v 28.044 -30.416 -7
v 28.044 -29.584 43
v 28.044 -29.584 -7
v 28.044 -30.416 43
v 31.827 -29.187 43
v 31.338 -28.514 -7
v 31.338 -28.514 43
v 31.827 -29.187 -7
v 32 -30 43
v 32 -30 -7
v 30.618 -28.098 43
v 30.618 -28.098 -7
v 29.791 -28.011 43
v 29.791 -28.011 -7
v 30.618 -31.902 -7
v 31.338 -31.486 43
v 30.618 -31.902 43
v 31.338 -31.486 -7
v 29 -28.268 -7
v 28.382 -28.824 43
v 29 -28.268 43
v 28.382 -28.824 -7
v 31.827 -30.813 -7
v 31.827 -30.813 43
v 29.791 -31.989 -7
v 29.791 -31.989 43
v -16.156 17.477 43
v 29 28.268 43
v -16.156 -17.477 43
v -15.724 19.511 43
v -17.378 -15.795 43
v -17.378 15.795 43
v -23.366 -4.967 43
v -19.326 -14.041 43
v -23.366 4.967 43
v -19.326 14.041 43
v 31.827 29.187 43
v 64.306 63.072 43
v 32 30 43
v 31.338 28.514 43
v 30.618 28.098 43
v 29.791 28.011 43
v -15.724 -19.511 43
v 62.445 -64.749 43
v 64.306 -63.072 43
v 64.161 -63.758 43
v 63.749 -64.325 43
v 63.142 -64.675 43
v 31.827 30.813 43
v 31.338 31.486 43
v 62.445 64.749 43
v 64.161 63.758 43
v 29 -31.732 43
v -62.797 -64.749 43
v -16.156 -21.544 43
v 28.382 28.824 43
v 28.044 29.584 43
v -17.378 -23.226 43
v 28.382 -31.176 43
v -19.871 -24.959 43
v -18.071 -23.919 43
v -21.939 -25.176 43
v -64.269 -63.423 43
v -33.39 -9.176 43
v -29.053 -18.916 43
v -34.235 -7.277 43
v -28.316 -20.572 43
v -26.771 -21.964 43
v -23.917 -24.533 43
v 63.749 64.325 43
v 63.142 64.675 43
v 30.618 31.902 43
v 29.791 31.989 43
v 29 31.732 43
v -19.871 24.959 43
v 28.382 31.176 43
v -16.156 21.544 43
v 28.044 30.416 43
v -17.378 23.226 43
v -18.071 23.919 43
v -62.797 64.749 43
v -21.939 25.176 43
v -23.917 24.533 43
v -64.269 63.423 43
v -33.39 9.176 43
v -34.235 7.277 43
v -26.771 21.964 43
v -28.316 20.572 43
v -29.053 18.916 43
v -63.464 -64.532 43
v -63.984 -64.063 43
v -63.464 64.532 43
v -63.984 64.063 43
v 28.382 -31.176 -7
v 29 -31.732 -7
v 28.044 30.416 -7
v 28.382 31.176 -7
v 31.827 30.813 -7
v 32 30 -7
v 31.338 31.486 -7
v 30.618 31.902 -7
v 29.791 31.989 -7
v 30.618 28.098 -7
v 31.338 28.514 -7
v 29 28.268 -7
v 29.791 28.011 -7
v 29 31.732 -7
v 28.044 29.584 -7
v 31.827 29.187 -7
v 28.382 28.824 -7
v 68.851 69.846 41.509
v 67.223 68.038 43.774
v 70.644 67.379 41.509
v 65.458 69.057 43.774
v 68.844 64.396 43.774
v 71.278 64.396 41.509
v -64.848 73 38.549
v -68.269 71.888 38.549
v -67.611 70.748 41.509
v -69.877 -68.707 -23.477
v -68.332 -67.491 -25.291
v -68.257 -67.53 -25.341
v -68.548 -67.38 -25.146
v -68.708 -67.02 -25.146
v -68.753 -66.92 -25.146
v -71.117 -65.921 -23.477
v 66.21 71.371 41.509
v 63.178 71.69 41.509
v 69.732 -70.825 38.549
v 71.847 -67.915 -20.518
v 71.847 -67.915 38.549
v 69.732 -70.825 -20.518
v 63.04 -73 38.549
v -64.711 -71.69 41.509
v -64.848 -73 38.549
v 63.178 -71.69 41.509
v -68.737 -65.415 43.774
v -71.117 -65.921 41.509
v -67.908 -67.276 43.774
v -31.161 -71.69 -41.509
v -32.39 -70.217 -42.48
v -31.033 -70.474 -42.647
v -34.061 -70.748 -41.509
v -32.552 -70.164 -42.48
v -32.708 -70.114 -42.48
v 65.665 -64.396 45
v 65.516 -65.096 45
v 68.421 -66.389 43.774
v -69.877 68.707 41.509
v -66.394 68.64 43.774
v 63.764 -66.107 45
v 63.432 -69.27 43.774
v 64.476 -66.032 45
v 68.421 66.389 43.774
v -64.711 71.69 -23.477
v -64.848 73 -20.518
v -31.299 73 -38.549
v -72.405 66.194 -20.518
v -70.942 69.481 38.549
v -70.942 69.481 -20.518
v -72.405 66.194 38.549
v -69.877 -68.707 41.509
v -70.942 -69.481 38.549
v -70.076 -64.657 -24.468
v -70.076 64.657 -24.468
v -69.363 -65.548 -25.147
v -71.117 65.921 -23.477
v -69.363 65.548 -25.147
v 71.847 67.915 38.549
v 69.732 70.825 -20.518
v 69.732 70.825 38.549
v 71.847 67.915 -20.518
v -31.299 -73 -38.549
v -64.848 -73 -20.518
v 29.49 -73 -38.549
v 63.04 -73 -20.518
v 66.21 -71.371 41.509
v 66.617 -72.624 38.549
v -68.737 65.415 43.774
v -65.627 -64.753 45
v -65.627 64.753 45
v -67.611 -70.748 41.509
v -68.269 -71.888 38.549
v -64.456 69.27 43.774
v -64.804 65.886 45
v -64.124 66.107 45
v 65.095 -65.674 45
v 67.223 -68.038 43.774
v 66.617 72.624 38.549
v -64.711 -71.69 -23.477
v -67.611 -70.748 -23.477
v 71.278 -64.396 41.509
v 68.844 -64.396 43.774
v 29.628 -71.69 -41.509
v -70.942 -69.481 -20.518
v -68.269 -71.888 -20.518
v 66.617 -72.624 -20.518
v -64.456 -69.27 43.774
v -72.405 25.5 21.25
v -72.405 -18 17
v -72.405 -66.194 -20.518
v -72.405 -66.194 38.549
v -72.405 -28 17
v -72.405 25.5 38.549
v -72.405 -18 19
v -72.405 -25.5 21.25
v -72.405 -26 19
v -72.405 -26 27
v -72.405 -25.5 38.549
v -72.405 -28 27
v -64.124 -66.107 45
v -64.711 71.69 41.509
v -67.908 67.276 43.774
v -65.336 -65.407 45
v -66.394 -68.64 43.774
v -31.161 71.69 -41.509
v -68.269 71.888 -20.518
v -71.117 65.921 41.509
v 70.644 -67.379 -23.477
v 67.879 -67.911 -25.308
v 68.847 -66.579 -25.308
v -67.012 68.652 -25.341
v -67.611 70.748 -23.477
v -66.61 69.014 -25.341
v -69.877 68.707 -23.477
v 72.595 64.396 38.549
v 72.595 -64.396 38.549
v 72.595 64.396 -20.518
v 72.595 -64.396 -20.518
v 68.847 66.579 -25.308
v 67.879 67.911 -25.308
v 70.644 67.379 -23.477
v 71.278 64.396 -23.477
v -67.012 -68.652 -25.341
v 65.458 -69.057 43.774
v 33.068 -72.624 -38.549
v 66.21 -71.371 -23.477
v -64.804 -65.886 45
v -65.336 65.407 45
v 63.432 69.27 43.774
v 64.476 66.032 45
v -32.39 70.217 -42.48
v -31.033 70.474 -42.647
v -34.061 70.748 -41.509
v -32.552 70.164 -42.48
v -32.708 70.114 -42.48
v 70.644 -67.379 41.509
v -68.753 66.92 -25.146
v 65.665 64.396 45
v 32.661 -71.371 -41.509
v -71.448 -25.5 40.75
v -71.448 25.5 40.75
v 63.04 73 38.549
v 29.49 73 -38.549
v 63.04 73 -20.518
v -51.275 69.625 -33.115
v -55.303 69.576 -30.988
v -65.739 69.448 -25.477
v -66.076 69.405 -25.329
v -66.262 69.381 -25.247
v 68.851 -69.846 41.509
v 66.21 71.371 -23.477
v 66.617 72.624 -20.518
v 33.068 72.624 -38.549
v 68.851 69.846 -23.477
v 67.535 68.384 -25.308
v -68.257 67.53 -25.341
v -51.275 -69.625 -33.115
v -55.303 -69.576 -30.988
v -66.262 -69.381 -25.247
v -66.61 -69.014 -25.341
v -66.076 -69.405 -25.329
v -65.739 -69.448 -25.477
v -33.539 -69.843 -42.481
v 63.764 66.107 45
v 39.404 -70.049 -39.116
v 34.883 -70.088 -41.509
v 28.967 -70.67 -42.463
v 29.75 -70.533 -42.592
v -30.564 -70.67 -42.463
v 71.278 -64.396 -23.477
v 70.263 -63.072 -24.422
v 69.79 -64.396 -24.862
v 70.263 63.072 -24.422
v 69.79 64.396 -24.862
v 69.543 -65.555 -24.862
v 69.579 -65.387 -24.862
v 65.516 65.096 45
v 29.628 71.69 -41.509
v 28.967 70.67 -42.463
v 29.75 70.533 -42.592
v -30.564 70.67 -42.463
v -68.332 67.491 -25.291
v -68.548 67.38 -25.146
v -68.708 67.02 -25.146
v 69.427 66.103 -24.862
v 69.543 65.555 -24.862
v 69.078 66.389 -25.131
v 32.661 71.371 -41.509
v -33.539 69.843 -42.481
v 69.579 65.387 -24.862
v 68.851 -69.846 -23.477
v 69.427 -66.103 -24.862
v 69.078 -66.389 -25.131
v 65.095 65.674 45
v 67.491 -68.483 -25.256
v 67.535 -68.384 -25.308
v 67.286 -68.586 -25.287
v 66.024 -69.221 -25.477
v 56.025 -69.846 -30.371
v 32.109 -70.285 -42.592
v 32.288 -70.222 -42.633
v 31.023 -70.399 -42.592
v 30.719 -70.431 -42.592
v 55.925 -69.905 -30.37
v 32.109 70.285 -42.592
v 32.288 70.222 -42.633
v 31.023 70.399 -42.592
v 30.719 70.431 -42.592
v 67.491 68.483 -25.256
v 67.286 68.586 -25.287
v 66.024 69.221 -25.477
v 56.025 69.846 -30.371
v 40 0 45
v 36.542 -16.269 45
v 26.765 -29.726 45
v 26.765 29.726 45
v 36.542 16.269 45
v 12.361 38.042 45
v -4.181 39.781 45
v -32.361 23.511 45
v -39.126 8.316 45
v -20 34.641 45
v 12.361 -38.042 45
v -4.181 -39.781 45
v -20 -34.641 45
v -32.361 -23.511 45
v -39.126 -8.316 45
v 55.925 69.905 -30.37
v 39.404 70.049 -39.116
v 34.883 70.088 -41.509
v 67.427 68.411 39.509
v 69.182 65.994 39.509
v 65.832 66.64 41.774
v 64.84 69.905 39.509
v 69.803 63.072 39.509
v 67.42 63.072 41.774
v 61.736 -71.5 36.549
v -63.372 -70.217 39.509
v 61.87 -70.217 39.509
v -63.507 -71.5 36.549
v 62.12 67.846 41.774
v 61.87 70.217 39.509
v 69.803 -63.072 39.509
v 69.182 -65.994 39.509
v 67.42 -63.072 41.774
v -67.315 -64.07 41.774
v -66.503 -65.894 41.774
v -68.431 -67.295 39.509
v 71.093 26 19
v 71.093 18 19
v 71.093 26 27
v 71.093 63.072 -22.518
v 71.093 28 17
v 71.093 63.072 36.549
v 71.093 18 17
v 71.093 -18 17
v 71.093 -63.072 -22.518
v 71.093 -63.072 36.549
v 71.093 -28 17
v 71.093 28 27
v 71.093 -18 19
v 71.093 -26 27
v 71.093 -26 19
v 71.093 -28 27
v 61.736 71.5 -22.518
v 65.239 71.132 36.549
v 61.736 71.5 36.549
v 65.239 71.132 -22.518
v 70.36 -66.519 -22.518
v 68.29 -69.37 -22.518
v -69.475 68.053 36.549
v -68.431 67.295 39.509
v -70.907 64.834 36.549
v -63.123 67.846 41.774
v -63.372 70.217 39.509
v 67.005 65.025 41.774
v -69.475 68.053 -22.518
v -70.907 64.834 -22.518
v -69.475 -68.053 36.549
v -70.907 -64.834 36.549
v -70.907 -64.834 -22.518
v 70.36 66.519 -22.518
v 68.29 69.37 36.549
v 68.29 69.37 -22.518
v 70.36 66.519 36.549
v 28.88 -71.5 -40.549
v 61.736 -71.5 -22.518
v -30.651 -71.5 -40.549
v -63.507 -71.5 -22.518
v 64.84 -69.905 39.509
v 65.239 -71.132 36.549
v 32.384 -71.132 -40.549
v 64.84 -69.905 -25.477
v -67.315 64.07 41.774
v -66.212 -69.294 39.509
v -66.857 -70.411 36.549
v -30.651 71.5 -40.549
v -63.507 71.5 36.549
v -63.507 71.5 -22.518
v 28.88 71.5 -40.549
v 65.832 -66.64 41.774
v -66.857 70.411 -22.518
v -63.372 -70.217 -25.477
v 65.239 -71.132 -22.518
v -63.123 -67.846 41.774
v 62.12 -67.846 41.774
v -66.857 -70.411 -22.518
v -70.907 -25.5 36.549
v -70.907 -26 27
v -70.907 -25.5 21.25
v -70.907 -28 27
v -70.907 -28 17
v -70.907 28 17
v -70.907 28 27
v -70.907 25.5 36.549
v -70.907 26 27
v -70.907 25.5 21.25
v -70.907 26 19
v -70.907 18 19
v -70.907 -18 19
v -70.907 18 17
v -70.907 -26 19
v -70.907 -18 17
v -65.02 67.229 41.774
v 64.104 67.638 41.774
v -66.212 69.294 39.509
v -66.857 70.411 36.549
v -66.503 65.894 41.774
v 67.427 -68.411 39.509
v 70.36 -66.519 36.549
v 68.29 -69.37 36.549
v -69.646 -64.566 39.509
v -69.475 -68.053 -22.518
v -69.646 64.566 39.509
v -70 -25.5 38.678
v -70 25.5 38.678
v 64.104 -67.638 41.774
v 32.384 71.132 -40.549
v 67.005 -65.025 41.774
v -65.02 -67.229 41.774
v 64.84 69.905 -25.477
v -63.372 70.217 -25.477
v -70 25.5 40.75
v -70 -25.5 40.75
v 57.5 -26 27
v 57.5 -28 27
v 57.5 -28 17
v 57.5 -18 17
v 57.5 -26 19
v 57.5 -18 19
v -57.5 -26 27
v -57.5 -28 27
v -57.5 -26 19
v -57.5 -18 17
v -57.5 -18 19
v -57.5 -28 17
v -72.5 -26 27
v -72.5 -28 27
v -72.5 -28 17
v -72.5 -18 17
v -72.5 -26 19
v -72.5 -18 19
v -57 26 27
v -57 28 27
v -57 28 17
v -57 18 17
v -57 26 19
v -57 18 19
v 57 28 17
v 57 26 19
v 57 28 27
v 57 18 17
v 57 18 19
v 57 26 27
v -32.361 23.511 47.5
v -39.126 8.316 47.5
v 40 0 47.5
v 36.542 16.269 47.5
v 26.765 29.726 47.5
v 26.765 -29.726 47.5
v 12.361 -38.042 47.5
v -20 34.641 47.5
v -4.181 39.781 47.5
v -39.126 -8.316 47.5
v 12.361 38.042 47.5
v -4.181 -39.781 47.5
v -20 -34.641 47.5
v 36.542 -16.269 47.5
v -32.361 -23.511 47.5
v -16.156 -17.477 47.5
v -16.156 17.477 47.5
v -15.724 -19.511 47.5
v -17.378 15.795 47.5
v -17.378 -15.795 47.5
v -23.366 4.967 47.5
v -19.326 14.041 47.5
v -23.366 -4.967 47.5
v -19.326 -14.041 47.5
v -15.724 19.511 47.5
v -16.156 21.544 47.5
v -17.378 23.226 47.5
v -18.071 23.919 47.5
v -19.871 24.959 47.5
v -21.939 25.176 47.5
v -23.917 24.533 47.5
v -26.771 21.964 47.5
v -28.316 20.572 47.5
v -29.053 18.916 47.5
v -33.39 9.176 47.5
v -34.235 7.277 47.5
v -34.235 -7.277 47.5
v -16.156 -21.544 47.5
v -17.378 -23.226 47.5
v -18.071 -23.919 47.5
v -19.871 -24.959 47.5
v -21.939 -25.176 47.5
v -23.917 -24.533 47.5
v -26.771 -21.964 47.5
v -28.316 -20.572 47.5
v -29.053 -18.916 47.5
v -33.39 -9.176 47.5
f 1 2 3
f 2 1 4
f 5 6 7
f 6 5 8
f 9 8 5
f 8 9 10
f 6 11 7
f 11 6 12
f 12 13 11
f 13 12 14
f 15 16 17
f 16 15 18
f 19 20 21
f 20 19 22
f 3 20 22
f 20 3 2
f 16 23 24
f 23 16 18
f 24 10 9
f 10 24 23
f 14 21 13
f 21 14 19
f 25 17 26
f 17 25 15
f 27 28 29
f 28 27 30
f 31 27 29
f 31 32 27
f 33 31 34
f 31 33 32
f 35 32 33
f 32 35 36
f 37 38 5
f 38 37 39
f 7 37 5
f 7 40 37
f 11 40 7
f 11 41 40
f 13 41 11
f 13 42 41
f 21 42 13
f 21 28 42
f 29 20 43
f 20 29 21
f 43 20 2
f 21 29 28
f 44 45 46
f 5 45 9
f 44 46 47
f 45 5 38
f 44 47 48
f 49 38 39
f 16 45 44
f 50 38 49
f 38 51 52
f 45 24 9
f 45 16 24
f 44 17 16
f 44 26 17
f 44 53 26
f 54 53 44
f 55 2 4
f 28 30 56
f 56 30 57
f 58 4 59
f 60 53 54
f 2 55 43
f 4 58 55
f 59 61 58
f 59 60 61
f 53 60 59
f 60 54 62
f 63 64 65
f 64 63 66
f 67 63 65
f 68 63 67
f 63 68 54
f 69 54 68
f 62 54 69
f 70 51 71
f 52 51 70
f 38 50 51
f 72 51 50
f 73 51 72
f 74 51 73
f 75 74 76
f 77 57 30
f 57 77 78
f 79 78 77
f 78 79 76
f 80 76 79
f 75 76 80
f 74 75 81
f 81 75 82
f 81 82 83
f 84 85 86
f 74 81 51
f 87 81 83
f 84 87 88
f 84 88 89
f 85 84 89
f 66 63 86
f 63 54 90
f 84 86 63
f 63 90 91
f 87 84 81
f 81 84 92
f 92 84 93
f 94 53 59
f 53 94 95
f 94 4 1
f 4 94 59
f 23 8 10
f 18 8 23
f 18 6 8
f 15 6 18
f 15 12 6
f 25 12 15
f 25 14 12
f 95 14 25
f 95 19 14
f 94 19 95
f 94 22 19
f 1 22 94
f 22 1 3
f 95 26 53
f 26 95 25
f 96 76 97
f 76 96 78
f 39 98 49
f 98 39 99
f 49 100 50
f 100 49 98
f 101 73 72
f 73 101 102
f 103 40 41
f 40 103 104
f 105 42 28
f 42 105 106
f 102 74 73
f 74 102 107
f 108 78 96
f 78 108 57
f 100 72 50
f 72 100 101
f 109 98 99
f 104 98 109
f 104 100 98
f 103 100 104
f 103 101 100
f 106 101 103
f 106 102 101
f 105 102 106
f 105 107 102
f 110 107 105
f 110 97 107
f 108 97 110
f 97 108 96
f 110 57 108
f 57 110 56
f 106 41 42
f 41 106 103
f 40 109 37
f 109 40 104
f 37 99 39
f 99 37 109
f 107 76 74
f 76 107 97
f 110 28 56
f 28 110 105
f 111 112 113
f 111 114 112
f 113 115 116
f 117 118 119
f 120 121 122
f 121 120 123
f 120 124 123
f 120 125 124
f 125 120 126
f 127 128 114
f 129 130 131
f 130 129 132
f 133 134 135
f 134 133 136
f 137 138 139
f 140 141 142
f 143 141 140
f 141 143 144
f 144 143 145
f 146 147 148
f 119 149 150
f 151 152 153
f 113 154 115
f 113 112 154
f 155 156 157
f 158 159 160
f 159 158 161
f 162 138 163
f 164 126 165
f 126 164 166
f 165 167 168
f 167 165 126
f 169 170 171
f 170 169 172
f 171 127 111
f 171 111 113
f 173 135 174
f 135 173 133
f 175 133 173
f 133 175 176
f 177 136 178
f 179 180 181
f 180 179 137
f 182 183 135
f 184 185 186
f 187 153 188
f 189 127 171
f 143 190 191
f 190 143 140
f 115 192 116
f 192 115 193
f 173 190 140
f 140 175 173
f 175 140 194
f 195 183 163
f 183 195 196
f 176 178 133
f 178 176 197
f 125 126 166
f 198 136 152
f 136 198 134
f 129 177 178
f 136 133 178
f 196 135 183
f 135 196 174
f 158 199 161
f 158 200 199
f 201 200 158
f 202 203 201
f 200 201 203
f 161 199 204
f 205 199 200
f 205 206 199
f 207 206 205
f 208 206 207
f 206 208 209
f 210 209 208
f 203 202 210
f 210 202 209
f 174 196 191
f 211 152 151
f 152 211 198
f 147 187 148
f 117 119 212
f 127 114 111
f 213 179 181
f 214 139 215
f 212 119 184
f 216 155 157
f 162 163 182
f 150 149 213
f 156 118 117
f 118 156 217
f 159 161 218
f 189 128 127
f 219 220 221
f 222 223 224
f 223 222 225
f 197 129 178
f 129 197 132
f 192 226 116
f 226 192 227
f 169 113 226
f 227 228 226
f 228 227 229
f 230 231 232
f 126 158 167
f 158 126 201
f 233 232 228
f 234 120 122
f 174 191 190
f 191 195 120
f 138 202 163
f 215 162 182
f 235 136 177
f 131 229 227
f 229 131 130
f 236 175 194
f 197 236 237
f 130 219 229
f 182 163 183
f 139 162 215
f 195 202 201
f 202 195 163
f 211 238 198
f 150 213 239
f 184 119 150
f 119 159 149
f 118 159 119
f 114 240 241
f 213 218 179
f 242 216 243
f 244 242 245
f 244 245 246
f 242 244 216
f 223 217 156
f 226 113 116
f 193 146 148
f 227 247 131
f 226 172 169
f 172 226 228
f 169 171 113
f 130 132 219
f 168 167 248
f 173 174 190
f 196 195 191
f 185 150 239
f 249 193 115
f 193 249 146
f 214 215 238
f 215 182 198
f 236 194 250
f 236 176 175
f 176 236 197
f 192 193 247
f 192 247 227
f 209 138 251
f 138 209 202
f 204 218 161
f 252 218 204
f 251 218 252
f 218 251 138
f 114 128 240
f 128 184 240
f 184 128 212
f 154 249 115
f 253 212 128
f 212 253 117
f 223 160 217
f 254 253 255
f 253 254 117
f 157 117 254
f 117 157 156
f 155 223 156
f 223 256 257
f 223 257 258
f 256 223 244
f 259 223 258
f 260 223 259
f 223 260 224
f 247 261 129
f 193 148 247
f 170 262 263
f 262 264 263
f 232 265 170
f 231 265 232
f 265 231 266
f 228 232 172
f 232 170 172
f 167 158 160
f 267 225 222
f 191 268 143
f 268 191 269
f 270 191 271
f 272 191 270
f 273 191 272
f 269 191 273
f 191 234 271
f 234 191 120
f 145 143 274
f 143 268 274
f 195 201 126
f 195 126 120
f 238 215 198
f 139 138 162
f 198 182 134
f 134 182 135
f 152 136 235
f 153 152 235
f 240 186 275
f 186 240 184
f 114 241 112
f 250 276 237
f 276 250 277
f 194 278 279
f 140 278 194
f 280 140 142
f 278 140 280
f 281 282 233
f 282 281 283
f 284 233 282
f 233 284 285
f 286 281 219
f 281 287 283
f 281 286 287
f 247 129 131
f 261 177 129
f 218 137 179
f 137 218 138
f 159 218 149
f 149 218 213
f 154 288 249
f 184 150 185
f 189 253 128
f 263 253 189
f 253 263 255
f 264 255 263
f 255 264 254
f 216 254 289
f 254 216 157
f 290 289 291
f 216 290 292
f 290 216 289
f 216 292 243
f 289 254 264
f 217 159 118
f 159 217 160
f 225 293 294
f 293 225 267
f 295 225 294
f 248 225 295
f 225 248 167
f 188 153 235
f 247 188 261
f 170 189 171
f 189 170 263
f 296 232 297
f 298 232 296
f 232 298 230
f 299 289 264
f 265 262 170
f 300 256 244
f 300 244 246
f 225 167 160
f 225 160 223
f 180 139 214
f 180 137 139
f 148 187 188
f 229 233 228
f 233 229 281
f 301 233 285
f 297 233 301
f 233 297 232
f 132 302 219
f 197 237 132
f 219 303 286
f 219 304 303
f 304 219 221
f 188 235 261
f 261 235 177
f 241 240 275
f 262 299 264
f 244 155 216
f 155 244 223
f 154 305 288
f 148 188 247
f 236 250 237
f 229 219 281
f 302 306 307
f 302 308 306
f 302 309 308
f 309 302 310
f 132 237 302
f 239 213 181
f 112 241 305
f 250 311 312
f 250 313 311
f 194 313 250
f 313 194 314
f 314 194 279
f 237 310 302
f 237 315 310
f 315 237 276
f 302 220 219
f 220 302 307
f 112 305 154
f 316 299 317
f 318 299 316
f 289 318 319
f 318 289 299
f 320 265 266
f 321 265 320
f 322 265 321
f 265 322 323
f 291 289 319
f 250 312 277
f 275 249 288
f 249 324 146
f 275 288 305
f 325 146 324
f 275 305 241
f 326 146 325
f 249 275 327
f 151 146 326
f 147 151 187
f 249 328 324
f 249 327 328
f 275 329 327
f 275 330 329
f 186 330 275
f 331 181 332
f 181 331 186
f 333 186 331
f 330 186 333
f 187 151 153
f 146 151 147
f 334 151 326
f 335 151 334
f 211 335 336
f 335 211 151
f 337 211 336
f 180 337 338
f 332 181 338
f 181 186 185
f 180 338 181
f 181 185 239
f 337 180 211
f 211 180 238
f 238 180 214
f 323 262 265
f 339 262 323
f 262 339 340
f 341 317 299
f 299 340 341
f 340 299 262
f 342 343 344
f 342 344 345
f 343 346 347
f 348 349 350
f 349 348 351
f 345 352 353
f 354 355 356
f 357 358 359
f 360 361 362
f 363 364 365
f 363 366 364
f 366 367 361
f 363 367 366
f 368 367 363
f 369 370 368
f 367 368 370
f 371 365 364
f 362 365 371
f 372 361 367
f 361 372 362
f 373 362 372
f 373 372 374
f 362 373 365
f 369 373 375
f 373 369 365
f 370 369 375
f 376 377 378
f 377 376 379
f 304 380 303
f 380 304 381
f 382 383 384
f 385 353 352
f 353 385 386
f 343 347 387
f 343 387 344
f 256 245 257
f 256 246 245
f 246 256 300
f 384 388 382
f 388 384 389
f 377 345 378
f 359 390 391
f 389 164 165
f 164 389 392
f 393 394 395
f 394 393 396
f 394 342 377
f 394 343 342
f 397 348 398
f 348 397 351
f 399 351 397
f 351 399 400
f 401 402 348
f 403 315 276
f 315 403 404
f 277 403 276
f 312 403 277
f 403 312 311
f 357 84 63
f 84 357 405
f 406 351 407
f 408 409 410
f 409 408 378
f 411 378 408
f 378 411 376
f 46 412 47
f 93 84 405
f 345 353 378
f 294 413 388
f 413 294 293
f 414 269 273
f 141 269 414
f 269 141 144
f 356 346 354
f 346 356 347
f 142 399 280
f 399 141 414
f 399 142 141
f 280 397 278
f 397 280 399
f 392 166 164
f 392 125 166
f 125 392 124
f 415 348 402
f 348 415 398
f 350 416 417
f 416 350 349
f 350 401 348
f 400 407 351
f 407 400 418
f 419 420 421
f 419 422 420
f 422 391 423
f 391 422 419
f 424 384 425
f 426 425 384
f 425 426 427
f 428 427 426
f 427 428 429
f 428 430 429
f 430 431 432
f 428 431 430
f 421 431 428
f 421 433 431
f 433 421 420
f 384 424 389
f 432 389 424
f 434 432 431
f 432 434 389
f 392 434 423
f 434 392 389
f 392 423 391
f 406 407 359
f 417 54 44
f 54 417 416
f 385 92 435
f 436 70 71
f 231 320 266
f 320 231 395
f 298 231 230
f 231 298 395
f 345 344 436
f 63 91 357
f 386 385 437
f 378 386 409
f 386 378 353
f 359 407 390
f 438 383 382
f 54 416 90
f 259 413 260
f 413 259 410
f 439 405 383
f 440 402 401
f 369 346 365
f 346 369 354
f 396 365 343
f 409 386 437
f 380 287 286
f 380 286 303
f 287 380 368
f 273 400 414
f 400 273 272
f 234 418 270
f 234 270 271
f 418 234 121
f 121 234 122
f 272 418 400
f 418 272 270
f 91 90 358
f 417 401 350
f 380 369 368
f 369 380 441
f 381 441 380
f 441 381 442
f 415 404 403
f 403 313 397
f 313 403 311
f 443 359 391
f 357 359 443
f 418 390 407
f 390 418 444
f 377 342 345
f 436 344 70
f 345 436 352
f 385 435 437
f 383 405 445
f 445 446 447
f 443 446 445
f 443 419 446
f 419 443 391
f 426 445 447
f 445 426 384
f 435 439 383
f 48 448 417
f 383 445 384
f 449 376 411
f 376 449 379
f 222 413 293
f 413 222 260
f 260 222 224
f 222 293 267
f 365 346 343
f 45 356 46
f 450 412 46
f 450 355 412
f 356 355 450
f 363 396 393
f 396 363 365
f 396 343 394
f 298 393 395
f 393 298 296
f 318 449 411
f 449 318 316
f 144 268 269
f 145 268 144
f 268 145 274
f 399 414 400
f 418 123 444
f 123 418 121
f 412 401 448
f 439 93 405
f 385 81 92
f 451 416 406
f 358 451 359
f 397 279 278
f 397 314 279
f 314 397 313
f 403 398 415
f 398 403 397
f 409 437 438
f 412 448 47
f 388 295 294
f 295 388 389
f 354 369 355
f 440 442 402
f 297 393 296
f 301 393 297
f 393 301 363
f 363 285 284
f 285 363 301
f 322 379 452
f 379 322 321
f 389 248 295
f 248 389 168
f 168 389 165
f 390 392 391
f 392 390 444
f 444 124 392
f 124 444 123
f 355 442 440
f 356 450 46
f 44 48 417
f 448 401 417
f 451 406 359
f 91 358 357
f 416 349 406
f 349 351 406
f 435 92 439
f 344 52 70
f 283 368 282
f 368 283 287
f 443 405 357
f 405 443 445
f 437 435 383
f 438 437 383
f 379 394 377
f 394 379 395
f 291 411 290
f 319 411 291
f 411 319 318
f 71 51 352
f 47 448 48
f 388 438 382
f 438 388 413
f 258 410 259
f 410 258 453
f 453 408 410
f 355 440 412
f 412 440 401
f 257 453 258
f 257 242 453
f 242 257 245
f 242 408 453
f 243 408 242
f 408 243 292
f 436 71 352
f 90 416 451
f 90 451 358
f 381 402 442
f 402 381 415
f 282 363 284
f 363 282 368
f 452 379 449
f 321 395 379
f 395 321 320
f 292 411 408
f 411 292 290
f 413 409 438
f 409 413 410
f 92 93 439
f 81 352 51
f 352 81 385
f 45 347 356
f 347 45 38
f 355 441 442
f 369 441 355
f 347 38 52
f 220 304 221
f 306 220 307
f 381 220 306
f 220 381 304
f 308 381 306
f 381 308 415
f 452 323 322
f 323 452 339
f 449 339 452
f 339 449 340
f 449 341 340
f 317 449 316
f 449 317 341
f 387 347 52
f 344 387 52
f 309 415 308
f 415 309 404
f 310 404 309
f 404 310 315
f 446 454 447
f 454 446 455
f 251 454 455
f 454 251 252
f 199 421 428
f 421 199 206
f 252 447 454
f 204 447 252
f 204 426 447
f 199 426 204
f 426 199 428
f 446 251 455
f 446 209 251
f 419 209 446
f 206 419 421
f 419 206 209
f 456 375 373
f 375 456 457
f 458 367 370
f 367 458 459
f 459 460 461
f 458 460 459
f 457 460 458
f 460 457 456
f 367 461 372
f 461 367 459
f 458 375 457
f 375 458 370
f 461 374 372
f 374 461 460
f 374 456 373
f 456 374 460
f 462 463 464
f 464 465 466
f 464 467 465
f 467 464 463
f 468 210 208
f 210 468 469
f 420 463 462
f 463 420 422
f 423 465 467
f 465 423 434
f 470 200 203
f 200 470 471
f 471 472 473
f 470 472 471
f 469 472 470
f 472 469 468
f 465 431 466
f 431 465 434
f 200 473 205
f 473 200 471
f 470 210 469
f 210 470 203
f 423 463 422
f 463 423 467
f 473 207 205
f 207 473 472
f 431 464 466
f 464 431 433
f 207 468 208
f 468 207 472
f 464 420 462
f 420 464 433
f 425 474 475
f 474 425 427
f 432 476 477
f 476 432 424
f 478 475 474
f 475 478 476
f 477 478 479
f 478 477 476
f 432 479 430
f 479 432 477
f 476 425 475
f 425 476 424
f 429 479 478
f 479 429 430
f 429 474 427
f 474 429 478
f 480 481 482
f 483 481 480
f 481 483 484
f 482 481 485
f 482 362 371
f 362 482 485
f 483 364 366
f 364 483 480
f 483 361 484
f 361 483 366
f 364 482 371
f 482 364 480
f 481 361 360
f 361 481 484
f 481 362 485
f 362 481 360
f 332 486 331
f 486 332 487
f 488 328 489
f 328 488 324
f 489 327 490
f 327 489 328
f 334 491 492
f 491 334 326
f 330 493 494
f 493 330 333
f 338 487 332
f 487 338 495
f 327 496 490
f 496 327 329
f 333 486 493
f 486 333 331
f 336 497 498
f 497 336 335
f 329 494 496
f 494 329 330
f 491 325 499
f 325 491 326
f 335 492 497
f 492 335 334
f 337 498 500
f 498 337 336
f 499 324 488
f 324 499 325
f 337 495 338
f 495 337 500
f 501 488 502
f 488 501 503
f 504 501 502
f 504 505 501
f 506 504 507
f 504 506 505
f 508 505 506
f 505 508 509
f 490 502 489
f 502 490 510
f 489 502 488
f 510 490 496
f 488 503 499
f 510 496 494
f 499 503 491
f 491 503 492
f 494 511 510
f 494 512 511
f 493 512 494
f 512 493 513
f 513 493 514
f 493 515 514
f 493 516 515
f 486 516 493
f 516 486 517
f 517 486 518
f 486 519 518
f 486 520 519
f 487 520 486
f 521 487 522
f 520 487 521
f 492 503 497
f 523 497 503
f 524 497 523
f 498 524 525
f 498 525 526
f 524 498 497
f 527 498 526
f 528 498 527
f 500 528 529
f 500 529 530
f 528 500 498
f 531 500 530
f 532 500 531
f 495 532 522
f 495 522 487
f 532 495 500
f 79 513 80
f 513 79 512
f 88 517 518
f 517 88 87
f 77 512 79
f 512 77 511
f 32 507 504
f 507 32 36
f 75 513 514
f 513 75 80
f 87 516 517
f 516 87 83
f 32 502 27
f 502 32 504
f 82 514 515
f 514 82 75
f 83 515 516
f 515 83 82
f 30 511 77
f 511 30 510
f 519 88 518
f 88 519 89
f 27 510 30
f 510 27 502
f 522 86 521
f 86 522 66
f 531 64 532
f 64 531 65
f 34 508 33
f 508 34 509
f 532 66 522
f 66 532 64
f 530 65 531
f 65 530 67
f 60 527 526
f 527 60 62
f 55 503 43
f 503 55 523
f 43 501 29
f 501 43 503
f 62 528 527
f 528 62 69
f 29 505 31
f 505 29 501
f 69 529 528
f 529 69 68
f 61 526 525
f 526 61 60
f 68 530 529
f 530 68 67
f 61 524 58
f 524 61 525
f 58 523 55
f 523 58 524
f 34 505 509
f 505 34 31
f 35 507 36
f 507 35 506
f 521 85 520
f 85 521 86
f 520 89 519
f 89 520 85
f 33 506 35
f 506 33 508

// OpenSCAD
$fn=15;
wall = 2.5;
bw = 110+ wall*2 ;
bd = 131 + wall*2;
bh = 50;
base_thick=2.5;
base_h_offset =0;

tile_w = 20;
tile_h = 20;
tile_edge_r = wall/4;

head_h=40;
head_w=130;
head_wall=1.5;

skirt_w = 140 +wall*2;
skirt_d = 146 ;
skirt_h = 90;
skirt_wr = 10;
skirt_dr = 10;
skirt_rh = 10;
skirt_r = 10;
skirt_wall_sides = 1.5;
skirt_wall_top = 2;



module pyramid(side=10, height=-1, square=false, centerHorizontal=true, centerVertical=false){
// creates a 3 or 4 sided pyramid.  -1 height= tetrahedron or Johnson's Solid square pyramid
	mHeight= height!=-1 ? height:
		square == true ? (1/sqrt(2))*side:		//square
			sqrt(6)/3*side;						//tetra
	vert= centerVertical!=true ? [0,0,0]:
		square==false ? [0,0,-mHeight/4] :	 //inscribes a tetra inside a sphere, not 1/2 ht
			[0,0,-mHeight/2];	//for squares, center=false inscribes, so true is just 1/2 ht
	horiz= centerHorizontal!= true ? [0,0,0] :
		square == true ? [-side/2, -side/2, 0] : 	//square
			[-side/2,-sqrt(3)*side/6 ,0];			//tetra
	translate(vert+horiz){
		if (square == true){
			polyhedron (	points = [[0,0,0],[0,side,0],[side,side,0],
								[side,0,0],[side/2,side/2,mHeight]], 
						faces = [[1,0,2], [2,0,3], [0,4,3], 
								[3,4,2], [2,4,1], [1,4,0]]);
		}
		if (square != true){
			polyhedron (	points = [[0,0,0],[side,0,0],[side/2,sqrt(3)*side/2,0],
								[side/2,sqrt(3)*side/6,mHeight]], 
						faces = [[0,1,2], [1,0,3], [2,1,3],[2,3,0]]);			
		}
}	}

module tile(){
    cube([tile_w,wall+0.03,tile_h],center=true);
    translate([0,0,0])
    {
        minkowski()
        {
            cube([tile_w,0.1,tile_h],center=true);
            sphere(r=tile_edge_r);
        }
    }
    translate ([-tile_w/2-tile_edge_r/2,0,-tile_h/2+tile_edge_r*2])
        sphere(r=tile_edge_r);

    translate ([tile_w/2+tile_edge_r/2,0,-tile_h/2+tile_edge_r*2])
        sphere(r=tile_edge_r);
    
}


module tiles(){
    for (x=[-2:2:3])    
    {    
        translate([x*tile_w,bd/2-wall/2,bh/2+tile_h/2])
        tile();   
        translate([x*tile_w,-bd/2+wall/2,bh/2+tile_h/2])
        tile();   
        
        translate([-bw/2+wall/2,x*tile_w,bh/2+tile_h/2])
        rotate([0,0,90])
        tile();   
        translate([bw/2-wall/2,x*tile_w,bh/2+tile_h/2])
        rotate([0,0,90])
        tile();     
    } 
}

module top(){
    
    difference()
    {
        cube ([bw,bd,bh+tile_h],center=true);
        translate([0,0,-wall])
        cube ([bw-wall*2,bd-wall*2,bh+tile_h],center=true);
        translate([0,0,-bh-tile_h/2])
        tiles();
    }   
    
}


module bottom(){
    difference()
    {
        cube ([bw,bd,bh],center=true);
        translate([0,0,bh/2+base_thick/2+base_h_offset])
        cube ([bw-wall*2,bd-wall*2,bh],center=true);
        translate([0,0,-bh/2-base_thick/2+base_h_offset])
        cube ([bw-wall*2,bd-wall*2,bh],center=true);
    }
    
    tiles();
   
}


d = 55; //31 - 45
module body(){
    translate([0,0,120])
    head(); 
    
    translate([0,0,d])
    top();

    translate([0,0,-d])
    bottom();    
}

module head(){   
difference()
{    
    minkowski()
    {
        
        cube([head_w,head_w,head_h],center=true);  
       sphere(r=10,h=1); 
   // translate([wall,wall,wall])
    //cube([bw-head_wall*2,bd-head_wall*2,head_h-head_wall*2],center=true); 
    }
}
}
module _skirt(){   
   // translate([0,0,80])
   // cube([skirt_w,skirt_d,3],center=true);
resize(newsize=[skirt_w,skirt_d,skirt_h])    
    minkowski()
    {    
        difference()
        {
            cube([skirt_w,skirt_d,skirt_h],center=true);   
            
            translate([skirt_w/2,0,-75])
            rotate ([0,-30,0])
            cube([150,skirt_d,skirt_h],center=true);   
            translate([-skirt_w/2,0,-75])
            rotate ([0,30,0])
            cube([150,skirt_d,skirt_h],center=true);   
        }
        
        sphere(r=skirt_r,h=1);

    }
}

module skirt(){
    
    // vertical stoppers
    translate([0,0,-7]){   
        translate([30,-30,0])
        cylinder(r=2,h=50);
        translate([30,30,0])
        cylinder(r=2,h=50);        
    }
    
    translate([0,0,46])
    cylinder (r=40,h=3,center=true);
    difference()
    {
        _skirt();
        
        translate([0,0,-skirt_wall_top])    
        resize(newsize=[skirt_w-skirt_wall_sides*2,skirt_d-skirt_wall_sides*2,skirt_h]) 
        _skirt();
        
        //132,50,18.5
        // window for battery
        translate([-skirt_w/2,0,32-1]) 
        cube([5,51,19.5],center=true);
        

        
//translate([0,0,skirt_h/2-skirt_wall_top])       
       // _turrent();
        // expose profile
        //translate([0,-skirt_d/2,0])    
        //cube([200,10,200],center=true);    
    }
    
    battcorners();    
}

module _turrent(){
    difference()
    {
        pyramid(skirt_w-10,70,true);
        translate([0,0,31])
        cube([skirt_w,skirt_w,60],center=true);
    }
}

module turrent(){
    difference()
    {
        //translate([0,0,18])
        _turrent();
        translate([0,0,-2])
        _turrent();
        //translate([0,0,-skirt_wall_top])
        //_turrent();
    }
}

module track(){    
translate([0,0.5,0])   
resize(newsize=[133,20,44])        
    minkowski()
    {    
        cube([133,20,44],center=true);
        rotate([90,0,0])
        cylinder(r=55,h=1);
    }

    translate([0,13,0])    
    cube([113.5,7,7.5],center=true); 
}
module tracks(){
    translate([0,-42-20/2,0])
    rotate([180,0,0])
    track();
    
    translate([0,42+20/2,0])    
    track();
}
module engine(){
    cube([110,40,43],center=true);
}
module engines(){    
    translate([0,-20.5,0])
    engine();
    
    translate([0,20.5,0])
    engine();
    
}
module simulate_enginetacks(){
    translate ([-5,0,-23])
    tracks();
    engines();
    
    // battery
    translate([-5,0,32])
    cube([132,50,18.5],center=true);
}

module battcorner(){    
    difference(){
        cube([15,10,10],center=true);
        translate([0,2,2])
        cube([18,10,10],center=true);
    }
}

module battcorners(){
    //132,50,18.5
    translate([skirt_w/2-7.5,-23,22])
    battcorner();
    translate([-skirt_w/2+7.5,-23,22])
    battcorner();
    
    rotate([0,0,180])
    translate([skirt_w/2-8,-23,22])
    battcorner();
    rotate([0,0,180])    
    translate([-skirt_w/2+8,-23,22])
    battcorner();
}


module _torso()
{
    // just to check size
    //translate([75,0,65])
    //cylinder(r=3,h=130,center=true);
    
    translate([0,0,-80],center=true)
    difference ()
    {
        rotate([0,180,0])
        { 
            minkowski()
            {
                pyramid(130,400,true,true,true);
                sphere(r=10);               
            }
        }
        translate([0,0,-70])
        cube([400,400,300],center=true);
    }    
}


module torso()
{   
    difference(){
    _torso();
    
    resize(newsize=[140,140,120]) 
   _torso();
    }   
}


module hands(){
    translate([0,67,140])
    rotate([0,0,90])
    hand();
    translate([0,-67,140])
    rotate([0,0,-90])
    hand(); 
}
module hand(){
    // sholder
    cube([20,15,30],center=true);
        
    // arm
    translate([15,0,-50])
    {
        minkowski(){
            cylinder(r=3,h=50);
            sphere(r=2);
        }
 
    }
}

module base_body(){
//translate([5,0,-3])
//simulate_enginetacks();

    difference(){    
    //turrent();
        //translate([0,0,skirt_h/2])
        skirt();
        
        // 90 deg wire hole on top of skirt
        translate([0,0,40]){
            minkowski(){
                difference (){
                    cylinder(r=30,h=5);
                    cylinder(r=29,h=5);  
                        translate([15,0,0])
                    cube([30,100,10],center=true);    
                        
                    translate([-10,30,0])
                    rotate([0,0,45])
                    cube([30,60,10],center=true);    
                    translate([-10,-30,0])
                    rotate([0,0,-45])
                    cube([30,60,10],center=true);     
                }
                cylinder(r=5,h=5);
            }
       }
    }


//translate([0,0,215])
//head();
    
//translate([0,0,50])    
//torso();
    
//hands();    
}





difference(){
    base_body(); // entire body
    // slice the skirt
    //translate([0,-60,0])
    //cube([200,40,200],center=true);
}
